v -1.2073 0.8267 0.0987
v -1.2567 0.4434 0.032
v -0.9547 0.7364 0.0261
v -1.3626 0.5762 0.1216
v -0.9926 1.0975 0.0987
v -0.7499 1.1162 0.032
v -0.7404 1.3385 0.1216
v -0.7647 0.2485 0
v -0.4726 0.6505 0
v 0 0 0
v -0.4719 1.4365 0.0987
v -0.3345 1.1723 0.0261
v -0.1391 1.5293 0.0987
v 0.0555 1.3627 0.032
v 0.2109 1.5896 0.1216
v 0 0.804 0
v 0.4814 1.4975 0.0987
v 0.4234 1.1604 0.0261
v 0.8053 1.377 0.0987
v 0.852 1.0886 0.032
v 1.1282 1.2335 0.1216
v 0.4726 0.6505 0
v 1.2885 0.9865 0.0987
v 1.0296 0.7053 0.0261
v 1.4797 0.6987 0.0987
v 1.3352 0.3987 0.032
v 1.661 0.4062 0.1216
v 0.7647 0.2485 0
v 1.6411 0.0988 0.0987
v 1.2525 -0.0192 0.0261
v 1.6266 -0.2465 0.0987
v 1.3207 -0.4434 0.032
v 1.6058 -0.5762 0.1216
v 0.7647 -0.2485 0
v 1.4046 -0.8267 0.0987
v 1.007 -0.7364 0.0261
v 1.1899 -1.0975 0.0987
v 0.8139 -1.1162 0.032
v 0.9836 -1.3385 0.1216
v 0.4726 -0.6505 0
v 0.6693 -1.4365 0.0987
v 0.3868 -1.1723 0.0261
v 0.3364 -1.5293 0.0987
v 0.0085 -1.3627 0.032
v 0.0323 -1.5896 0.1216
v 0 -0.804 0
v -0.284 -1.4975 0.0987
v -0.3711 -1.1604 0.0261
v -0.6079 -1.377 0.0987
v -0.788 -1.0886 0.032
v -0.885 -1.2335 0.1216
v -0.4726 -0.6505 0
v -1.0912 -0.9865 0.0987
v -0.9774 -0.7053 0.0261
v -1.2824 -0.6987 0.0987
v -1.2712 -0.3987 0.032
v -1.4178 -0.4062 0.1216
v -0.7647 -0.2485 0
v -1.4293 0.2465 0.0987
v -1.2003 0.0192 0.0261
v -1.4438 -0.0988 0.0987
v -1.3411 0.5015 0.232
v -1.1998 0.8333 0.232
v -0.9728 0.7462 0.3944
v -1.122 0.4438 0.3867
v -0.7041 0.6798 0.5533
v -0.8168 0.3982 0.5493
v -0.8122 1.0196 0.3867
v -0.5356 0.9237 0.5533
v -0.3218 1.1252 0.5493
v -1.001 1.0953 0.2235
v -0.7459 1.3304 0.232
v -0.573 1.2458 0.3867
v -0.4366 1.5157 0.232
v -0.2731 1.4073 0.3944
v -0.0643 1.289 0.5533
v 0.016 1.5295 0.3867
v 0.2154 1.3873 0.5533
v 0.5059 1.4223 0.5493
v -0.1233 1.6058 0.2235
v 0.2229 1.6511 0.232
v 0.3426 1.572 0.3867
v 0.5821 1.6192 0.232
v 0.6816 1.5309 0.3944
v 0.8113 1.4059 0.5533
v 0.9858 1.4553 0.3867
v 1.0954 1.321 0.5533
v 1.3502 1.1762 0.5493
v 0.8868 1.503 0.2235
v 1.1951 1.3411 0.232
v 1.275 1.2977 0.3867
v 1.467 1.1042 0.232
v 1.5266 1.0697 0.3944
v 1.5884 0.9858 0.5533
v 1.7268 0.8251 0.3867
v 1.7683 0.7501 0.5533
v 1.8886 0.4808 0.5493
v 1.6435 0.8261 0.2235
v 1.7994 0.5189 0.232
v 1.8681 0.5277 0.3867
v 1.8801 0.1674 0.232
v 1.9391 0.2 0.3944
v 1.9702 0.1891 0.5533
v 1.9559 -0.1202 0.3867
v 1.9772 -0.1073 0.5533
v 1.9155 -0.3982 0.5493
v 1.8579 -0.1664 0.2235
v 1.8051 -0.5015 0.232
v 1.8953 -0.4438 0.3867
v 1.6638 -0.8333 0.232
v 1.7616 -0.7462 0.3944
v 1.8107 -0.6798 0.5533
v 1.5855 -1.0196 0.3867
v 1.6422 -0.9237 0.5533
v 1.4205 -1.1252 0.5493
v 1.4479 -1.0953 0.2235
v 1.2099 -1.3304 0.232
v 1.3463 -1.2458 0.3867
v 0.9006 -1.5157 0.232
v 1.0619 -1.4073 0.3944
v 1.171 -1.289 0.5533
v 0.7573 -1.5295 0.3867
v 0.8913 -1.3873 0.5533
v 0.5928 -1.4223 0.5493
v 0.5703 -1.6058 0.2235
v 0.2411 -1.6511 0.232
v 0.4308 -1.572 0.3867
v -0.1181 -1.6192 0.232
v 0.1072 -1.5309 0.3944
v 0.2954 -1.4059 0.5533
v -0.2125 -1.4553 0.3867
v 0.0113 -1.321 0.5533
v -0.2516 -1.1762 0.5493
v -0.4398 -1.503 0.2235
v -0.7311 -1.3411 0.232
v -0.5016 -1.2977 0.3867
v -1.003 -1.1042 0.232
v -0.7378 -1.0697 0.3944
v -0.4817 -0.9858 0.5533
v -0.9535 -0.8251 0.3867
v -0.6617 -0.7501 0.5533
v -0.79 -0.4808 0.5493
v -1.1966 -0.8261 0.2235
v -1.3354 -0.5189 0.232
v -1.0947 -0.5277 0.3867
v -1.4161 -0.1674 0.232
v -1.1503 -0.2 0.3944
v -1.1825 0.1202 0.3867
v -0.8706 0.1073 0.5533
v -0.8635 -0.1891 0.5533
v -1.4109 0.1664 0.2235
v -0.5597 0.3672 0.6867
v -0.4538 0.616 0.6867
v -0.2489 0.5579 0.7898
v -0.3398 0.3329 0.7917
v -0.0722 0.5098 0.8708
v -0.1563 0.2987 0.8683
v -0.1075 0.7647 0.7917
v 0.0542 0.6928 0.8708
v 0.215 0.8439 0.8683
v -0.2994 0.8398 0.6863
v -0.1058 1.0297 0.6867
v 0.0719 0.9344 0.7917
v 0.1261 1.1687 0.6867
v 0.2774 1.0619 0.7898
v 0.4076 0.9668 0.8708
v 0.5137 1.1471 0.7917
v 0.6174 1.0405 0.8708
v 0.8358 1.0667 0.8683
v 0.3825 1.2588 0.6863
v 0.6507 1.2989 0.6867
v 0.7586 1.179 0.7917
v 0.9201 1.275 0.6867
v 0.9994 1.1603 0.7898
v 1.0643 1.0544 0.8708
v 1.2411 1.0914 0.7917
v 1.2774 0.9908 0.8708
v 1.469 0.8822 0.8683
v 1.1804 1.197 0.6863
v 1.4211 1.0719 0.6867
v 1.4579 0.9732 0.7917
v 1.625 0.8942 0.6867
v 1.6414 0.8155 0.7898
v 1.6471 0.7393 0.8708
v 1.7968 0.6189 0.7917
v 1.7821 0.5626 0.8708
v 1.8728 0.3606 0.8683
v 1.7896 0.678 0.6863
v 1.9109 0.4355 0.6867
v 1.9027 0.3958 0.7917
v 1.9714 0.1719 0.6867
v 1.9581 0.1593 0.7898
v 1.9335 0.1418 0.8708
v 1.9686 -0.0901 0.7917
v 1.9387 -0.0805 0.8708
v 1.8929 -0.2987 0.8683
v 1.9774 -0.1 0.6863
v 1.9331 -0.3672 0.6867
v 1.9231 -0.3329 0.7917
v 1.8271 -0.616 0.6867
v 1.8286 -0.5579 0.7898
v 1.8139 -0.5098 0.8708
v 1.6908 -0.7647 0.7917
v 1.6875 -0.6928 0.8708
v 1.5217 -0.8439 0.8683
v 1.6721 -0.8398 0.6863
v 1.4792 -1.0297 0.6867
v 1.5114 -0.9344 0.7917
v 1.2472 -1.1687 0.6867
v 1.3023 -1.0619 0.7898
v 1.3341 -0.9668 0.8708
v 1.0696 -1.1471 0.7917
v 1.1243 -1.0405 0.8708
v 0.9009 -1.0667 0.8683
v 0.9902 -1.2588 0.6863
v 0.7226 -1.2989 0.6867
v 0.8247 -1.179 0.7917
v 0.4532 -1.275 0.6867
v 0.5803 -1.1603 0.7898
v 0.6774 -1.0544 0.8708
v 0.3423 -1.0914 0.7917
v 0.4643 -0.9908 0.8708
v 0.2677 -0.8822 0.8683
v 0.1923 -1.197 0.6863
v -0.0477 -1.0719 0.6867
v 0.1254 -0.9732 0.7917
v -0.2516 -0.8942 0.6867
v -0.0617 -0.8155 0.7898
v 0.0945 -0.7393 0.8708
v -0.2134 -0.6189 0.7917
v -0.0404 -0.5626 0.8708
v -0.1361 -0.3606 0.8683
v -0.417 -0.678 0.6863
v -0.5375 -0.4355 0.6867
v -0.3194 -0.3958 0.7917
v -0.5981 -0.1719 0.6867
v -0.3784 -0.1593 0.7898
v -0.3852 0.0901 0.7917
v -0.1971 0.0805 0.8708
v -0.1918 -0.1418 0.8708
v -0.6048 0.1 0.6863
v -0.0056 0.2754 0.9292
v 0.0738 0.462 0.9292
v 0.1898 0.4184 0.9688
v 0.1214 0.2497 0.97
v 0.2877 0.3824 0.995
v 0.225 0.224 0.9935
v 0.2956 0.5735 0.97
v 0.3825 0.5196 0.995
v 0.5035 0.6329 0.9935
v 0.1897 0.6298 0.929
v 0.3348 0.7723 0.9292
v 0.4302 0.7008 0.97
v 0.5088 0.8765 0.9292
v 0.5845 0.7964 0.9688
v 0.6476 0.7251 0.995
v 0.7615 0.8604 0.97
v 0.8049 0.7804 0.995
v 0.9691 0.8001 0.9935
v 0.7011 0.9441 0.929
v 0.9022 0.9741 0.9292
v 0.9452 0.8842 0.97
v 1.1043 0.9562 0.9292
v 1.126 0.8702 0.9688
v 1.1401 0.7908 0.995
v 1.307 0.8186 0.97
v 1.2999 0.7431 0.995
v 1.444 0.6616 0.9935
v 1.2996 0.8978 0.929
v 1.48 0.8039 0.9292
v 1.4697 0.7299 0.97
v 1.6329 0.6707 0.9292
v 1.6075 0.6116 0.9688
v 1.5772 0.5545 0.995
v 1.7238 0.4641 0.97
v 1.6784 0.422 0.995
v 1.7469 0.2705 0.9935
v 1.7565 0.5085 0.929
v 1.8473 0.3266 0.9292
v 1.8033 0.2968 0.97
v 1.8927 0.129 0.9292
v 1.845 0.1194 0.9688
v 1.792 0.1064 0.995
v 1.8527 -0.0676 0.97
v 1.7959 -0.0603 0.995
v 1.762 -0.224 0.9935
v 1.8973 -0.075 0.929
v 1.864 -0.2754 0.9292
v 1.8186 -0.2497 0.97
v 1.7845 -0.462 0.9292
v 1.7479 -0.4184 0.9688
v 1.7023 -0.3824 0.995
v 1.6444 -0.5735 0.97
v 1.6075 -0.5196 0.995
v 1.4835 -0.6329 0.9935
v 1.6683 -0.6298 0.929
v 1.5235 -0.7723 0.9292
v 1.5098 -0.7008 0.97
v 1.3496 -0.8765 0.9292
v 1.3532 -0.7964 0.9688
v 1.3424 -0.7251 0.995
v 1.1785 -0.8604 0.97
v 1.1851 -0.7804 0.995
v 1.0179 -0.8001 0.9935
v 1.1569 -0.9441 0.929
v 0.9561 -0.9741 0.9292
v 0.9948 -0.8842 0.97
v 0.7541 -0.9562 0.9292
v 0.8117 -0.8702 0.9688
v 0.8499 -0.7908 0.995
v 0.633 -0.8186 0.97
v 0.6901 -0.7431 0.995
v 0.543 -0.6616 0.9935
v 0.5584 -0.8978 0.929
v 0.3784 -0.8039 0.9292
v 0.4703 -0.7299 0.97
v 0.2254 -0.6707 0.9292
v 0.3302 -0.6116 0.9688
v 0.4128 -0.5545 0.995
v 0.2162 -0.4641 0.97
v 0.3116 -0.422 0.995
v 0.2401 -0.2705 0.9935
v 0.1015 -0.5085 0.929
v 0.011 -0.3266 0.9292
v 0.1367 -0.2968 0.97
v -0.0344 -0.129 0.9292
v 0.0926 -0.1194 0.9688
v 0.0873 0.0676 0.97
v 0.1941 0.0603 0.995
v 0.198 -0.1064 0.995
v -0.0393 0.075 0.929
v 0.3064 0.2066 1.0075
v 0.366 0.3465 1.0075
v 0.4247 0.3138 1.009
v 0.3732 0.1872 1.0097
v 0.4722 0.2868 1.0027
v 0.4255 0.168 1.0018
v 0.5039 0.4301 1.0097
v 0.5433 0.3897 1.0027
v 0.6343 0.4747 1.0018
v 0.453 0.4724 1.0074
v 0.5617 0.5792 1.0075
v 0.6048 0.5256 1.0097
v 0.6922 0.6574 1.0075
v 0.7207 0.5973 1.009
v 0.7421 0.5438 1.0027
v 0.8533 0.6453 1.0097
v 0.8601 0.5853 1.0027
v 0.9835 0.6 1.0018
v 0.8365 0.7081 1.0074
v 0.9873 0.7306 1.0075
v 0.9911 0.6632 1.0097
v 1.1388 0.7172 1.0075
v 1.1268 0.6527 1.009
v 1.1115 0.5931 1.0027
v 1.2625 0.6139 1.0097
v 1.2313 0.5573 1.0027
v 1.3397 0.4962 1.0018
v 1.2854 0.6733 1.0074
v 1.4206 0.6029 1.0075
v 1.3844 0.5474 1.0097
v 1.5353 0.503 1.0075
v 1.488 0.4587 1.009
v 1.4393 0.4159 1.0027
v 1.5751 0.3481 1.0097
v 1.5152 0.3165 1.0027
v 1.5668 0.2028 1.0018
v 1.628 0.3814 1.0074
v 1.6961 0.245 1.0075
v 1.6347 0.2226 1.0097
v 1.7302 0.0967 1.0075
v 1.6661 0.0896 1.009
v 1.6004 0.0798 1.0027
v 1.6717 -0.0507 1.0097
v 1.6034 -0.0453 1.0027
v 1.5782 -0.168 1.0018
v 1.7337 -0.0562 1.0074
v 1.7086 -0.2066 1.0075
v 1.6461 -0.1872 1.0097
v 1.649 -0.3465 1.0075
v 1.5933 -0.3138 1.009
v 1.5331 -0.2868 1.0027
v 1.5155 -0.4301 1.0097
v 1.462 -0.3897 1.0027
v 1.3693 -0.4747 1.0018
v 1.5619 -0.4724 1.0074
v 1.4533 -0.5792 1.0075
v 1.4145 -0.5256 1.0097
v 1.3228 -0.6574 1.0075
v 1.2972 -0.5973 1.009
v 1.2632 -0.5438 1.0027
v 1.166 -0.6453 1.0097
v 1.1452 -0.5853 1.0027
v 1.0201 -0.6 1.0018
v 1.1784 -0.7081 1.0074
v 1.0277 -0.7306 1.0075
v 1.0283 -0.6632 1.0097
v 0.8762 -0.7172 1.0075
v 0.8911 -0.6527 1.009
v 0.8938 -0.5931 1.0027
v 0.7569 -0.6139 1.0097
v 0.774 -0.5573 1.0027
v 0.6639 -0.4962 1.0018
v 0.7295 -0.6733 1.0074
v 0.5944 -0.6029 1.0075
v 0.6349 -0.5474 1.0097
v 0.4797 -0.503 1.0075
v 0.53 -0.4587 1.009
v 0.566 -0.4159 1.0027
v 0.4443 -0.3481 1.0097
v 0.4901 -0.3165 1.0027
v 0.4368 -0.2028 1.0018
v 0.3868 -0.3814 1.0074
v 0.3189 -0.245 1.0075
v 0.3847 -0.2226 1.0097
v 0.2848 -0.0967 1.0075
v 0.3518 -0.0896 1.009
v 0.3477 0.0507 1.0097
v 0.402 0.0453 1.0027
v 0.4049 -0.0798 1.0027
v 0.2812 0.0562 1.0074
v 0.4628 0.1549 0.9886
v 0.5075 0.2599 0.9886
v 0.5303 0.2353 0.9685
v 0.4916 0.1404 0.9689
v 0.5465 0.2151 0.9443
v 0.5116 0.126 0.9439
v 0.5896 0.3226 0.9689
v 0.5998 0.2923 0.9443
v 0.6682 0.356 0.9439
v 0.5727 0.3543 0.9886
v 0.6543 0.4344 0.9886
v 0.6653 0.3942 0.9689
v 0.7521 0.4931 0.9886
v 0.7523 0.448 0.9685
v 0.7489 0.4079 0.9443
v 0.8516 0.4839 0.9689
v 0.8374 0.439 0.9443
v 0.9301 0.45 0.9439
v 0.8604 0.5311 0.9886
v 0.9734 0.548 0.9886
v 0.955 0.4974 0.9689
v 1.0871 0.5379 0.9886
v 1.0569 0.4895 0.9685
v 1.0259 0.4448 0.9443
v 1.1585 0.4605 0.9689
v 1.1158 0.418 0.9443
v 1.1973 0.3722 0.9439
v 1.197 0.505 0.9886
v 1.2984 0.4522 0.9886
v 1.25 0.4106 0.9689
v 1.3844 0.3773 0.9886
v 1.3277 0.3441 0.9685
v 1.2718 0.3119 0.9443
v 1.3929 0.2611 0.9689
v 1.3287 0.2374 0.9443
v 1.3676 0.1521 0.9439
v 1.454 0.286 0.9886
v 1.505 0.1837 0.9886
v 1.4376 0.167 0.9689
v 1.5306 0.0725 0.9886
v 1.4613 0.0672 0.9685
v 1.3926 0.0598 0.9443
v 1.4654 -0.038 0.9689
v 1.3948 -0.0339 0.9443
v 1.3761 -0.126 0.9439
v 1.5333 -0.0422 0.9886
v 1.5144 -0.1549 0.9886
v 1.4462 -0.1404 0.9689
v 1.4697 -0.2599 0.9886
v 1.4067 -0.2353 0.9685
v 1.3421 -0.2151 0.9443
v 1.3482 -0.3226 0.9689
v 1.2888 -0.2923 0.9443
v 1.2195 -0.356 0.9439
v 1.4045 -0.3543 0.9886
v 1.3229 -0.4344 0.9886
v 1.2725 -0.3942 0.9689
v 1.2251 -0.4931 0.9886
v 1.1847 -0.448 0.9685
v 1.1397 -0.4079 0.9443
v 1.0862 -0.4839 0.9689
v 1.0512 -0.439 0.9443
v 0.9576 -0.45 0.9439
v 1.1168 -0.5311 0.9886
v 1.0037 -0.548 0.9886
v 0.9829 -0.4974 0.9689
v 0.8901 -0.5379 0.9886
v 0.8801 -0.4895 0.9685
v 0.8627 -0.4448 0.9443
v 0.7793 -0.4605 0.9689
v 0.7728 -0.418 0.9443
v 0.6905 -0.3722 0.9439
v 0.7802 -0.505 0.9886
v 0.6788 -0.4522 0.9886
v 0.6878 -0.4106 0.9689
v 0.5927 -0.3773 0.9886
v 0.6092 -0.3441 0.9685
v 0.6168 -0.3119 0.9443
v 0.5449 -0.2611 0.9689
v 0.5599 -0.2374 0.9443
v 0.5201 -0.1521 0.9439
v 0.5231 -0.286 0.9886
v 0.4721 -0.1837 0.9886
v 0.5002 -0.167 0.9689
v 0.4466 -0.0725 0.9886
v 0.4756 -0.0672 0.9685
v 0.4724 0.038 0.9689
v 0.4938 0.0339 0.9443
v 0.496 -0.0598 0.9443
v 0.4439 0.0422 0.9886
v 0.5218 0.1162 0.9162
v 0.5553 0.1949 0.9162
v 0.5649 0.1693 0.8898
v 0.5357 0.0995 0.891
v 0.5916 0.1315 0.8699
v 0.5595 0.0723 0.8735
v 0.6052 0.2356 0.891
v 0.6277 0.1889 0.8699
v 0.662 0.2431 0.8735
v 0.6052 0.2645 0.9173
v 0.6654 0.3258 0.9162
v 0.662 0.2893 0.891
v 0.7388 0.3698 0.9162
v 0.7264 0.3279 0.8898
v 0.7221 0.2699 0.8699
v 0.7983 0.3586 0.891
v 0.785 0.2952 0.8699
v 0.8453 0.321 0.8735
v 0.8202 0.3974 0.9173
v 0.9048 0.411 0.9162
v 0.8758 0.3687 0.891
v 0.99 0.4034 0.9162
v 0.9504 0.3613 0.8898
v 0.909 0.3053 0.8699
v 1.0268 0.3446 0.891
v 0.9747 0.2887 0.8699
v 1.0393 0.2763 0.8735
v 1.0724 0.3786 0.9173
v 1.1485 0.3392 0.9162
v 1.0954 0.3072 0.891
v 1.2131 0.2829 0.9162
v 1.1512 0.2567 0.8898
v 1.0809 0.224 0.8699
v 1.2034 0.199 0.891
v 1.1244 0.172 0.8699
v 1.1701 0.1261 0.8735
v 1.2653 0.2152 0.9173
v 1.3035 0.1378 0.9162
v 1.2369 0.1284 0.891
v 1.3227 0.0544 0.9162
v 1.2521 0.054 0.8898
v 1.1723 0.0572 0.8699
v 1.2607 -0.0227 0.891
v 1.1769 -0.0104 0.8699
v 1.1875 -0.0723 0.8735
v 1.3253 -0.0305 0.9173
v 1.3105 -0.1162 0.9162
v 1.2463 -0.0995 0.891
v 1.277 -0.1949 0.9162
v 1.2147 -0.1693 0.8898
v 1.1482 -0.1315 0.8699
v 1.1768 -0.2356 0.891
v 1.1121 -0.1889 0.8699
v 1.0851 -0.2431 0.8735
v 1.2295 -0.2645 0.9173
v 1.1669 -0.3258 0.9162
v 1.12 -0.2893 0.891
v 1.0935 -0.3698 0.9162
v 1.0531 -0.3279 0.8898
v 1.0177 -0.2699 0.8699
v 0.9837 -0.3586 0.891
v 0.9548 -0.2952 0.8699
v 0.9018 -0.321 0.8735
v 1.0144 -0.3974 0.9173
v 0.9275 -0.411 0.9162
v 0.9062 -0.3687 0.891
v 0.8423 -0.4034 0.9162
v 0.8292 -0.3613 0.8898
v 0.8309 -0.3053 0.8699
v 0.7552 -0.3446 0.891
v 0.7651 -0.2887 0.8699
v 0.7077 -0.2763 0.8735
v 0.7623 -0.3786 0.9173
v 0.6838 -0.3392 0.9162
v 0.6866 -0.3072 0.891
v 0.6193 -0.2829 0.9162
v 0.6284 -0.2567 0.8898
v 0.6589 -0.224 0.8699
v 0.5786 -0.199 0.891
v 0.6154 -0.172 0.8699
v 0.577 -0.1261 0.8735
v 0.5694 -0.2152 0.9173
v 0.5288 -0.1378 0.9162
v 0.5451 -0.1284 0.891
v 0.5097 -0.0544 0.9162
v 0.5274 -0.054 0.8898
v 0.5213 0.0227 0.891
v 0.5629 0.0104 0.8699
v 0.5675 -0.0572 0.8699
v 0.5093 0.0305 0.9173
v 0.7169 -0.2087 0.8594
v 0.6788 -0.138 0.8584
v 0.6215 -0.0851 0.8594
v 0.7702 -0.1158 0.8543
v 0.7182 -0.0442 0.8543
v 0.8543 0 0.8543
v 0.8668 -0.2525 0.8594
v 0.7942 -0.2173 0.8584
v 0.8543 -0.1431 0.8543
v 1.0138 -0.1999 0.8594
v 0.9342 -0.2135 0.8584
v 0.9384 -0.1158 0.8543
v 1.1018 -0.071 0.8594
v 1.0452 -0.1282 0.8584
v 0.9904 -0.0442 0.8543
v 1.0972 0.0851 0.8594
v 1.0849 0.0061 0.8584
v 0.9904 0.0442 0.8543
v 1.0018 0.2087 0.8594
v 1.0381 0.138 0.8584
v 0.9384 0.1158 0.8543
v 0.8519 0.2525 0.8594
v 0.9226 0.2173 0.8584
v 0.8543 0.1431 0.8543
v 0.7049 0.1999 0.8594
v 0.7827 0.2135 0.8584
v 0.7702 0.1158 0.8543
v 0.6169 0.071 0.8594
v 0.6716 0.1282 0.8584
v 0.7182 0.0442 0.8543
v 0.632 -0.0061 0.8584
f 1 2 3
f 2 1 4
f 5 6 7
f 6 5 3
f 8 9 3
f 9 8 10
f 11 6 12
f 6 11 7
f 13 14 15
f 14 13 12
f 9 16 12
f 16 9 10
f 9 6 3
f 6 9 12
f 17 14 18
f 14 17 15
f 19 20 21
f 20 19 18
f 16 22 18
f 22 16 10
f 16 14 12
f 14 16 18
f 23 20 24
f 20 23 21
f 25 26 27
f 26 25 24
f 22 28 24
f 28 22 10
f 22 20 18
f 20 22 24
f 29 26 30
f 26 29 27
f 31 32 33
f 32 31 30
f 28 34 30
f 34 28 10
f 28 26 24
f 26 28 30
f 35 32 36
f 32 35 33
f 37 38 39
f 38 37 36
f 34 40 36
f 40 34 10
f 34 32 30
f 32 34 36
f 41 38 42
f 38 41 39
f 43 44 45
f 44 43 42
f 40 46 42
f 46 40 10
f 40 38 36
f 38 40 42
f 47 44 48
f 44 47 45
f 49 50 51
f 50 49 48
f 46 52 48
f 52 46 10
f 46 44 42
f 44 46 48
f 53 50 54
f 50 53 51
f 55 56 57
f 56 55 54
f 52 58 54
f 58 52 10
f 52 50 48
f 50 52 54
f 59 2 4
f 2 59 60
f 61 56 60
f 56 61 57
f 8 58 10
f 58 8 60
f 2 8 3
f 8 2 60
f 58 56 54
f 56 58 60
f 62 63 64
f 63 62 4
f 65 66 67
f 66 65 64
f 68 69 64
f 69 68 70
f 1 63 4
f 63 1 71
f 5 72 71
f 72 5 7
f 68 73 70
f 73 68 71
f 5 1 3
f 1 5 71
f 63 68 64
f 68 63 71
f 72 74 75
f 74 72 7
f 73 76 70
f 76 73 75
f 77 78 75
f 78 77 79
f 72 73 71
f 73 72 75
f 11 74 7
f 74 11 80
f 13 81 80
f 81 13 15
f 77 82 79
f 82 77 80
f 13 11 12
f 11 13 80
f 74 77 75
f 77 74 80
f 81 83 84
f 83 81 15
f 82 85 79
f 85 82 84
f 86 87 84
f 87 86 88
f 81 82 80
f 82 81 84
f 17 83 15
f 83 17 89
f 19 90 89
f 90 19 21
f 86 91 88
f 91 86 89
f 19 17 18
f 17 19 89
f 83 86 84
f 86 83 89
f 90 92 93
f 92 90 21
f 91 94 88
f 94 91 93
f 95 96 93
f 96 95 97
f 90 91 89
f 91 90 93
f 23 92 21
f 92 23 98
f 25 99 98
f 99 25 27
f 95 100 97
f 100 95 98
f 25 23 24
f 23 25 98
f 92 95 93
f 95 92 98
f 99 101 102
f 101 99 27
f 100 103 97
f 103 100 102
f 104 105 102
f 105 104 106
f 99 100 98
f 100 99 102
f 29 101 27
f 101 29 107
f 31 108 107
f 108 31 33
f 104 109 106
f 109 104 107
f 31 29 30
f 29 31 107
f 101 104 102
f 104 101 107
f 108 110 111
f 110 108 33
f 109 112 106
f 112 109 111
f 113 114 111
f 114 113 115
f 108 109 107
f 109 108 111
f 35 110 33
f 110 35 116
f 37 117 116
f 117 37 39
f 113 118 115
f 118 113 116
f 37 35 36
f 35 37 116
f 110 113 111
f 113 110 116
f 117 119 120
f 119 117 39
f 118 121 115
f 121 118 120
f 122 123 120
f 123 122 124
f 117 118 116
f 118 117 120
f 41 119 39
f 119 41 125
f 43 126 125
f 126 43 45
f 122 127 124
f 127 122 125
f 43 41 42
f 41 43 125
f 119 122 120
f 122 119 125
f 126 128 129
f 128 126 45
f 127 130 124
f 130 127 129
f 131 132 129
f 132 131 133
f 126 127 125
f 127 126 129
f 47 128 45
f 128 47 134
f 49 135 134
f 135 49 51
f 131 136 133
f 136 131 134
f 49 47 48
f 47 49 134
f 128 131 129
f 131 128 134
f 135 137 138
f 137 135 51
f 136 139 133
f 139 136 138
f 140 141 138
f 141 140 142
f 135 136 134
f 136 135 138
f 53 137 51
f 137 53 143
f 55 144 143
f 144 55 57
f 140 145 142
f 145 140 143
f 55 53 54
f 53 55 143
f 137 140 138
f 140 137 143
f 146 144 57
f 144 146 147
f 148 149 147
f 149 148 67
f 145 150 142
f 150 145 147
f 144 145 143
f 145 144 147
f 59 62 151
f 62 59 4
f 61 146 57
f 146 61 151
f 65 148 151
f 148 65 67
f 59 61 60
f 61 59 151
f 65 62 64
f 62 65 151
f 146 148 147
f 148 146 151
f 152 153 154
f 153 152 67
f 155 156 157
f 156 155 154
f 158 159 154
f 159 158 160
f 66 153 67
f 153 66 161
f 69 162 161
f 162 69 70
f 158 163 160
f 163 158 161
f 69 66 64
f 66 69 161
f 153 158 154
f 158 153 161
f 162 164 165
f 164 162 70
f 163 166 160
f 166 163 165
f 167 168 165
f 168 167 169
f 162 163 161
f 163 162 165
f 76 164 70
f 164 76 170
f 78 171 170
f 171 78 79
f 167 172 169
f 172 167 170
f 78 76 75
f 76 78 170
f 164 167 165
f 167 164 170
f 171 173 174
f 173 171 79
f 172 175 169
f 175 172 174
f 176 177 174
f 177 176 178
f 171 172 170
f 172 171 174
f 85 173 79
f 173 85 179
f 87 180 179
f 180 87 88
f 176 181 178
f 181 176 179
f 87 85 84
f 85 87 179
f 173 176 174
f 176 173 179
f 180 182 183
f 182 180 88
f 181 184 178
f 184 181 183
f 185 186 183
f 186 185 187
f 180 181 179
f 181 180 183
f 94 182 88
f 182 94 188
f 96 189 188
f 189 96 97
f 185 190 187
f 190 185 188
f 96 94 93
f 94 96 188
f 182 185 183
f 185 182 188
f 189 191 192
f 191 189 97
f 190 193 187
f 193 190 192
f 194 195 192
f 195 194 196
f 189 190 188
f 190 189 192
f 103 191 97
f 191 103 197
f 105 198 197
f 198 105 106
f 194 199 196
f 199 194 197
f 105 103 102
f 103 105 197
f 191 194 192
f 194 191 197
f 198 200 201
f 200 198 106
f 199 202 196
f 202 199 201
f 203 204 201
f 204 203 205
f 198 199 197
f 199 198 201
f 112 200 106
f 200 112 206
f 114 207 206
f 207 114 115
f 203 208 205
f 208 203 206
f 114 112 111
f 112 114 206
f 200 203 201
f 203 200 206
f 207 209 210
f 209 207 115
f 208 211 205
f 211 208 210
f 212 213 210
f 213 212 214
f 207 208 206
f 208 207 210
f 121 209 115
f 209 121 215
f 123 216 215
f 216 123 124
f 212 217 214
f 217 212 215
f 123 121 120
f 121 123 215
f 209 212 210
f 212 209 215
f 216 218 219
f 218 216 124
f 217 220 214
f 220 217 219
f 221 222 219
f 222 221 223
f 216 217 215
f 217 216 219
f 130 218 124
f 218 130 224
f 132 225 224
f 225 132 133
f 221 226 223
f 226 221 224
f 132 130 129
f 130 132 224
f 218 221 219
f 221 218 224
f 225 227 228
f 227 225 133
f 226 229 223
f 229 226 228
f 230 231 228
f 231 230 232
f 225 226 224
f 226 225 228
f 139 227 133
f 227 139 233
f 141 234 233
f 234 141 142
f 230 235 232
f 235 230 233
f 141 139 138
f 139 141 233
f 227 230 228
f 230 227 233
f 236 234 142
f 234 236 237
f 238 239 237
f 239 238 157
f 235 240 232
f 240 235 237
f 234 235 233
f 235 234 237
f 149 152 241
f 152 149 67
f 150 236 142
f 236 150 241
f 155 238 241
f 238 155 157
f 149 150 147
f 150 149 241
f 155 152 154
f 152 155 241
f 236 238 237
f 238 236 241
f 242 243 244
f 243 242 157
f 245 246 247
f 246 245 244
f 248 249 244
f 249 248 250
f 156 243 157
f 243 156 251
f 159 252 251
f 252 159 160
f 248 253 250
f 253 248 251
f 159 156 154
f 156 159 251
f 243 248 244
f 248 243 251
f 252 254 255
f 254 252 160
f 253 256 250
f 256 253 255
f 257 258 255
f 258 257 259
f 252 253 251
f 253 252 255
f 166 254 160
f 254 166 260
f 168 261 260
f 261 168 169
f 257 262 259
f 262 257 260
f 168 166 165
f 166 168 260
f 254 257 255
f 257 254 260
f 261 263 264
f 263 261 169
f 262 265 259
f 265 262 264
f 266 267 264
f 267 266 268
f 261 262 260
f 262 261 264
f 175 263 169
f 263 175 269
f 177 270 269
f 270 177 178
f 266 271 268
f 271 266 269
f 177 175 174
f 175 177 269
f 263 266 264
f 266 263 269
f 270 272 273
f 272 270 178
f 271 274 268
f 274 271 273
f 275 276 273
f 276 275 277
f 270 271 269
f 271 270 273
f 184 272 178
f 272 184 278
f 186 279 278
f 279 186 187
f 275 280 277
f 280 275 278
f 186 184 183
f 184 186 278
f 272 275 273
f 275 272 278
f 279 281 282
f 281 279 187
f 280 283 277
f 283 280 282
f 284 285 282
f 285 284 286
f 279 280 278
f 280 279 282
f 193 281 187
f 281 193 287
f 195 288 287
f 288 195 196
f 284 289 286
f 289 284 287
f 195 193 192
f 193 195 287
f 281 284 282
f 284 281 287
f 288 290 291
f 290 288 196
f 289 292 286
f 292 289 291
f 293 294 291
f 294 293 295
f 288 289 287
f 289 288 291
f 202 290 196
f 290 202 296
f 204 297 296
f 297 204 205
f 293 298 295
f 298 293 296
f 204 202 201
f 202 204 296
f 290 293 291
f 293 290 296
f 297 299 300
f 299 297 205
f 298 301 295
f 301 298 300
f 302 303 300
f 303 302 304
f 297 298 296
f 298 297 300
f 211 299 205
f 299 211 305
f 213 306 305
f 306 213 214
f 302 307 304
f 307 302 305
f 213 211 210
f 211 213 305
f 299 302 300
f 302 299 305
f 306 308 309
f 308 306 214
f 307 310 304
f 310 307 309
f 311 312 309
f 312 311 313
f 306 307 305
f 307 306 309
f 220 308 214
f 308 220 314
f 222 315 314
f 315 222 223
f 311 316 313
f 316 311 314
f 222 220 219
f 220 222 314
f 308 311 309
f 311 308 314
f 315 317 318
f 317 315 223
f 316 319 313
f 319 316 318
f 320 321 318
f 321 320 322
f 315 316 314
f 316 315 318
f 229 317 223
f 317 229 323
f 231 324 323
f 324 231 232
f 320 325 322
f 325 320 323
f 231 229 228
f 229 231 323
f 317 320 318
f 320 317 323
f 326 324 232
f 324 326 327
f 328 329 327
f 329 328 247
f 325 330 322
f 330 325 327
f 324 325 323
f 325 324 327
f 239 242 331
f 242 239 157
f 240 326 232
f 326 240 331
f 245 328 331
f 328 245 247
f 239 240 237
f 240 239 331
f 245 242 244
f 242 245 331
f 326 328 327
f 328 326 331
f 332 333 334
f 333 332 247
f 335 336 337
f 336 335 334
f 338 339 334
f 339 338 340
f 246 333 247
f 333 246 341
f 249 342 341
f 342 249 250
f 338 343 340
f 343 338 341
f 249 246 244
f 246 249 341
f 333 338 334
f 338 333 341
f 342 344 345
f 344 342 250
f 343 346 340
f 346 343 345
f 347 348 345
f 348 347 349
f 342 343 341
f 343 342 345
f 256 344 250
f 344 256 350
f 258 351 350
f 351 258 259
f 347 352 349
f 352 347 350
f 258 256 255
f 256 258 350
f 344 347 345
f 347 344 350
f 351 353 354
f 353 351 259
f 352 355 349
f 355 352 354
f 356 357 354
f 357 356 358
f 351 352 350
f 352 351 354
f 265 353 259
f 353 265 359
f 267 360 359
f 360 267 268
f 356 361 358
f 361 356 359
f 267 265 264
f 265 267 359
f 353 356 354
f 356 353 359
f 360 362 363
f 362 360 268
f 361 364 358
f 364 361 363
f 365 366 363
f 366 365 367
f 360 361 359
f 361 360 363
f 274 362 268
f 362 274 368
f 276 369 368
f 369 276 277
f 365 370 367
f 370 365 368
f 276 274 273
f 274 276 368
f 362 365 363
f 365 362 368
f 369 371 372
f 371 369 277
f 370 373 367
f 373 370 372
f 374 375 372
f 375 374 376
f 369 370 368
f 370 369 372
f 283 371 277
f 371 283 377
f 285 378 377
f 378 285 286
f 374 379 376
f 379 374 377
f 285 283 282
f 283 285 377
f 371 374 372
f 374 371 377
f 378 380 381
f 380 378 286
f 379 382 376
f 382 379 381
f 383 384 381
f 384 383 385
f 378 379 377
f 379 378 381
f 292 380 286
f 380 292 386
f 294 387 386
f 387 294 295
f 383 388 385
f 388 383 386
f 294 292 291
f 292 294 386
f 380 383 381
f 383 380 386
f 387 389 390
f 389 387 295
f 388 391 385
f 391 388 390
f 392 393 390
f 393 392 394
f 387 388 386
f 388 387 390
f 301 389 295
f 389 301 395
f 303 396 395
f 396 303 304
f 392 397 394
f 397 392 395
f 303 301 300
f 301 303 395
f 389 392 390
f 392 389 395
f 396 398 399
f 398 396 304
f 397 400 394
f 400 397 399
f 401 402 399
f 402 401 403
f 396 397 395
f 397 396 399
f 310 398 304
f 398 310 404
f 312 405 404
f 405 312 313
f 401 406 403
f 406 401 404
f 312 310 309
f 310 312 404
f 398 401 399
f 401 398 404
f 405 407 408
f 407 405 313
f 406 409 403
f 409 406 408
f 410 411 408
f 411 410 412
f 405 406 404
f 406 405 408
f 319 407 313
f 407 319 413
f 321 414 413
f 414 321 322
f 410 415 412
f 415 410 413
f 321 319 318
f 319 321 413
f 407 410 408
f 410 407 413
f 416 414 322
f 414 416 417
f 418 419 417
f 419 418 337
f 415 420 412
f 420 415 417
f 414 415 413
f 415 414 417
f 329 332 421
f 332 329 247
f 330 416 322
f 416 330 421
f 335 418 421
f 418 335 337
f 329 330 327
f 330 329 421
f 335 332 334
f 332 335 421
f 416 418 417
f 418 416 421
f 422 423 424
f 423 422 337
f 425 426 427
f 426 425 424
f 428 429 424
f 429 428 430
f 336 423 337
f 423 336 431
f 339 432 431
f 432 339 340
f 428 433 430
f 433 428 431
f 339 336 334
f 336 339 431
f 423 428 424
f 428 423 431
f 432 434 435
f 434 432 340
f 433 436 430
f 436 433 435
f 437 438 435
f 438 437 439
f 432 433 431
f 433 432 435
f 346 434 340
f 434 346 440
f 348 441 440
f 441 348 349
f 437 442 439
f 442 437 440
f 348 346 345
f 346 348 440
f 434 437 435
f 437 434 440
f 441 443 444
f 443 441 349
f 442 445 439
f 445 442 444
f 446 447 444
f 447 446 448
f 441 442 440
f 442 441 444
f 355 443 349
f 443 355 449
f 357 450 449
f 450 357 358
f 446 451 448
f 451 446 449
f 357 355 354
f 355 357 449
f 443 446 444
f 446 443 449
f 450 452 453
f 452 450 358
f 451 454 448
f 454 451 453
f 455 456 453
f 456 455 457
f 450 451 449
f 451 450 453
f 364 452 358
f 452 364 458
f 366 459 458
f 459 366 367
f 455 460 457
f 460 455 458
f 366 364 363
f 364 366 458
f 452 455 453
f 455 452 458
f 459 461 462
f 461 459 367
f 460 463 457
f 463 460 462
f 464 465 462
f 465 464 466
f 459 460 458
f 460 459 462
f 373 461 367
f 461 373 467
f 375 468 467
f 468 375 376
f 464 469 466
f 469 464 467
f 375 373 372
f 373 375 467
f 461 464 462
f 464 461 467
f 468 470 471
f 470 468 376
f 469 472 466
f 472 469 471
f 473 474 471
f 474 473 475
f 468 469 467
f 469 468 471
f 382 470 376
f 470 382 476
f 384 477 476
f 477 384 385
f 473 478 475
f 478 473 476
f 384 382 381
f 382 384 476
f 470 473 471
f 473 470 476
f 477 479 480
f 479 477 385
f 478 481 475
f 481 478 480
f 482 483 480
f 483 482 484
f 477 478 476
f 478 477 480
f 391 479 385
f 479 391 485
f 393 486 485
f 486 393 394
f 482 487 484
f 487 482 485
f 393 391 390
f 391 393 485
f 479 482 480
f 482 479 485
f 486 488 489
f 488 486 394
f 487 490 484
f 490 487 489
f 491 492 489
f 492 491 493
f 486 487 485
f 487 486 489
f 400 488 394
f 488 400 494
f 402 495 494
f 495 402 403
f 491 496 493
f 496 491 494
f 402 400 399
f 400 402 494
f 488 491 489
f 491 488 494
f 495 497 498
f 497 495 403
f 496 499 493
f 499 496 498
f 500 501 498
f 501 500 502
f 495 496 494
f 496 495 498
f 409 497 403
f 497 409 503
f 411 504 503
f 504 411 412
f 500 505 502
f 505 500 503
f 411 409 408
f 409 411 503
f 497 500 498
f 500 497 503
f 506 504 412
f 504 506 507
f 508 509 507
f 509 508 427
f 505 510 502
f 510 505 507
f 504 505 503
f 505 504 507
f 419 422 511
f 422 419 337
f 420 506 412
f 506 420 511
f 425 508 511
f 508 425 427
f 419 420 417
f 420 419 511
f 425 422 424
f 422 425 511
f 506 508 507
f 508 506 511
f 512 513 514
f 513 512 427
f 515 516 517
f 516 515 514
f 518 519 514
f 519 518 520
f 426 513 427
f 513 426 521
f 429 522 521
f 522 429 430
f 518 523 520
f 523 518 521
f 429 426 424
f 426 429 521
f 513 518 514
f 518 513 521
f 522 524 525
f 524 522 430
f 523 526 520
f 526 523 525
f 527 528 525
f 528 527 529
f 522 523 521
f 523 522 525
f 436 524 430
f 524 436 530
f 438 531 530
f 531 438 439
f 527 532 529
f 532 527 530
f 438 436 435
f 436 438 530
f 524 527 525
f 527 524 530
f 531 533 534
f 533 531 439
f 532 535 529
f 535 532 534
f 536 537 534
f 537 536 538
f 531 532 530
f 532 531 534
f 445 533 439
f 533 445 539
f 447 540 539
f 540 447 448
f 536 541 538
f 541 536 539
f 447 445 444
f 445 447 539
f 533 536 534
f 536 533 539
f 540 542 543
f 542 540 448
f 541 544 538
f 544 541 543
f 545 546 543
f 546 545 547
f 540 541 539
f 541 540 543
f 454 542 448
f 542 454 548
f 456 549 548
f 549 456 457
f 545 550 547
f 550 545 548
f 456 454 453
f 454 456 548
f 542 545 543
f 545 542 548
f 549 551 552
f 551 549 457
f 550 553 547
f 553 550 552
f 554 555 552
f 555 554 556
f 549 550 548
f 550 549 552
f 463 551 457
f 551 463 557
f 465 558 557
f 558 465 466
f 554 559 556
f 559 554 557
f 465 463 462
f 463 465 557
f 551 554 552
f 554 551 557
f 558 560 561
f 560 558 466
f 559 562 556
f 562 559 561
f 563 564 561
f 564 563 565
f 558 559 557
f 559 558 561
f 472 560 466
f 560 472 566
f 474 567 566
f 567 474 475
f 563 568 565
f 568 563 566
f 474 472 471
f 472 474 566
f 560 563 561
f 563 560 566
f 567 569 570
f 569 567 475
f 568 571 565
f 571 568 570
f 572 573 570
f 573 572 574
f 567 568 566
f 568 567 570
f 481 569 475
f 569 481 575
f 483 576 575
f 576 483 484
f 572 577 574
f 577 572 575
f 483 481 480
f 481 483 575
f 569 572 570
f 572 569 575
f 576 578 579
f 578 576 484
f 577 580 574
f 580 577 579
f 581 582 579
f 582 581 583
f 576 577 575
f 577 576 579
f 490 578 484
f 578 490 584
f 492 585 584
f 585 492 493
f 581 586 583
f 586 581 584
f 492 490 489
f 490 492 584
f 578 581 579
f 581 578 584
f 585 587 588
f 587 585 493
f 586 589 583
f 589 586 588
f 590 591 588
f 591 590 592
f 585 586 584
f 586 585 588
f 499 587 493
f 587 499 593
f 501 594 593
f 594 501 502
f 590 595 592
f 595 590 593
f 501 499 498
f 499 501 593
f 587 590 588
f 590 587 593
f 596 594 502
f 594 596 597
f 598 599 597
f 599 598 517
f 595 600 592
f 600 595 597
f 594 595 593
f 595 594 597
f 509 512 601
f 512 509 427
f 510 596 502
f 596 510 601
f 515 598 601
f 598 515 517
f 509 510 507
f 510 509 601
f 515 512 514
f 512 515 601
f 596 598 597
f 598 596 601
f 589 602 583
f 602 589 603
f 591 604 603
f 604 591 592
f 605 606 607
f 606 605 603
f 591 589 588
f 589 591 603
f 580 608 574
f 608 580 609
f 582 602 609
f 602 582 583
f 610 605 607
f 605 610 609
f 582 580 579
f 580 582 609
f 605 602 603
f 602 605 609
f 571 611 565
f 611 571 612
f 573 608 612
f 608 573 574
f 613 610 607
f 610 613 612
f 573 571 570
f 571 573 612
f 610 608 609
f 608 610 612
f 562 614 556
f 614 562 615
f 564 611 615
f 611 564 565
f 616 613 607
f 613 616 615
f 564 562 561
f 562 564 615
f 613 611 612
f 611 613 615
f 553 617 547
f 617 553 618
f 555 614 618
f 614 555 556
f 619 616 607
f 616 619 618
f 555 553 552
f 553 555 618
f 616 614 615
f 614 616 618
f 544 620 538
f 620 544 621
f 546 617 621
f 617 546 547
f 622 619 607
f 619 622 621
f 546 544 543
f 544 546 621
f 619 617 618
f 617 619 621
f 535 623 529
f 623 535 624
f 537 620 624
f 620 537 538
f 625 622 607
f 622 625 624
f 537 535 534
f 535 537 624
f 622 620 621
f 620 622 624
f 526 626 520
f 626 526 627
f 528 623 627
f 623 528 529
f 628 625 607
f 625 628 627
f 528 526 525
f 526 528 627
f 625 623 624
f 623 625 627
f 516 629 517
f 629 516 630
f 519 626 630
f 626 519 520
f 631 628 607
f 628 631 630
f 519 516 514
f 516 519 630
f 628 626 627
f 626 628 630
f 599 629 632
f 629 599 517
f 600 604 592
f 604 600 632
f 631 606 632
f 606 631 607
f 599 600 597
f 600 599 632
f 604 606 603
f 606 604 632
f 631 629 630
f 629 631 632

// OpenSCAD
C0 = (un(rndc()) + [2, 0, 0]);
C1 = (un(rndc()) + [2, 2, 0]);
C2 = (un(rndc()) + [0, 2, 2]);
m=[ringrot(ringon(10,2),0),[[0,1,10],[1,2,10],[2,3,10],[3,4,10],[4,5,10],[5,6,10],[6,7,10],[7,8,10],[8,9,10],[9,0,10]]];//


d=extrude(m,[0,1,2,3,4,5,6,7,8,9 ],[0.6,0,0.6],0.75,6);
//polyhedron(d[0],d[1]);
t=cc(d,2,0.6);
//echo(m[0]);
for (i=[0:max(0,len(m[1])-1)])echo( m[0][i]);

//trender(t);
polyhedron(t[0],t[1]);

function extrude(mesh,ring, length,scali,n=0)=
let(rl=len(ring),oldfaces=mesh[1],oldpoints=mesh[0],pl=len(oldpoints),

newpoints=[for (i=[0:rl-1])oldpoints[ring[i]]*scali+length],

newfaces=[for (ii=[0:0.5:rl-0.5])let(i=floor(ii))i==ii?

[ring[i],pl+i,pl+((i+1)%rl)]
:
[ring[i],pl+((i+1)%rl),ring[((i+1)%rl)]]],



newmesh=[concat(oldpoints,newpoints),concat(oldfaces,newfaces)]
)n>1?
let(newring=[for (i=[0:rl-1])(pl+i)])
extrude(newmesh,newring,length*0.75,scali,n-1)
:
let(newring=concat([for (i=[0:rl-1])((pl+rl)-1-i)],pl+rl))
[concat(oldpoints,newpoints,[avrg(newpoints)]),concat(oldfaces,newfaces,ring2faces(newring))]
 ;


function ring2faces(ring)=let(lr=len(ring))[for(i=[0:lr-2])[ring[i],ring[((i+1)%(lr-1))],ring[lr-1]]];


































module trender(t){
for (i=[0:max(0,len(t[1])-1)]){
  n = un(p2n(t[0][t[1][i][0]],t[0][t[1][i][1]],t[0][t[1][i][2]]));
color(un((C0 * abs(n[0]) + C1 * abs(n[1]) + C2 * abs(n[2]) + [1, 1, 1] * abs(n[2])) / 4)) 
polyhedron(t[0],[t[1][i]]);

}}



function cc(V,n=1,curve=0.61803398875)=n<=0?V:n==1?
let(w=V)
let(ed= cccheck(ccquicksort(ccquicksort(ccquicksort(ccquicksort(ccde(w[1],len(w[0])-1),2),1),0),1)))

let (nf=ccnf(ed))
[ccnv(w,nf,curve),nf]
:
let(w=cc(V,n-1,curve))
let(ed= cccheck(ccquicksort(ccquicksort(ccquicksort(ccquicksort(ccde(w[1],len(w[0])-1),2),1),0),1)))
let (nf=ccnf(ed))
[ccnv(w,nf,curve),nf]
;


function ccnv(v,nf,curve)=
let (nv=[for(i=[0:len(v[1])-1]) (v[0][v[1][i][0]]+v[0][v[1][i][1]]+v[0][v[1][i][2]])/3 ])
let(sfv= [ for(i=[0:len(v[0])-1]) avrg(ccfind(i,v[1],nv))])
concat(lerp(v[0],sfv,curve),nv);

function ccnf(hf)=
[for(i=[0:1:len(hf)-1])
(i%2)==0?
[hf[i][4],hf[(i+1)%len(hf)][2],hf[i][2]]
:
[hf[i][4],hf[(i-1)%len(hf)][2],hf[i][2]]
];

function ccde(faces,points) =
let(l=len(faces)-1)
   [for (i=[0:l])
    let(f = faces[i])
       for (j=[0:len(f)-1])
          let(p=f[j],q=f[(j+1)%len(f)])
              [min(p,q),max(p,q),i+points+1,p,q]  // no duplicates
   ];
function cccheck(ed)=concat(
[for(i=[0:len(ed)-1])if(
(ed[i][0]==ed[i-1][0]&&ed[i][1]==ed[i-1][1])
||(ed[i][0]==ed[i+1][0]&&ed[i][1]==ed[i+1][1])
)ed[i]]);
function ccfind(lookfor,faces,nv) =  
     [ for (i=[0:len(faces)-1]) if(
faces[i][0]==lookfor||faces[i][1]==lookfor||faces[i][2]==lookfor) nv[i] ];

function ccquicksort(arr,o) = !(len(arr)>0) ? [] : let(
    pivot   = arr[floor(len(arr)/2)],
    lesser  = [ for (y = arr) if (y[o]  < pivot[o]) y ],
    equal   = [ for (y = arr) if (y[o] == pivot[o]) y ],
    greater = [ for (y = arr) if (y[o]  > pivot[o]) y ]
) 
concat(
    ccquicksort(lesser,o), equal, ccquicksort(greater,o)
);
function wave(w,a=1,b=1)=[[for(i=[0:len(w[0])-1])
let(x=w[0][i][0],y=w[0][i][1],z=w[0][i][2])
w[0][i]+[sin((y+z)*b)*a,sin((z+x)*b)*a,sin((x+y)*b)*a]],w[1]]; 
function ccweld(v)=let(data=v[0])
[v[0],[for (i= [0:len(v[1])-1])let(index1=v[1][i][0],index2=v[1][i][1],index3=v[1][i][2])

concat(search(data[index1][0],data),search(data[index2][0],data),search(data[index3][0],data,1))
]];

function ccflip(w)=[w[0],[for(i=[0:len(w[1])-1])[w[1][i][0],w[1][i][1],w[1][i][2]] ]];
function un(v) = v / max(len3(v), 0.000001) * 1;
function p2n(pa, pb, pc) =
let (u = pa - pb, v = pa - pc) un([u[1] * v[2] - u[2] * v[1], u[2] * v[0] - u[0] * v[2], u[0] * v[1] - u[1] * v[0]]);
function avrg(v) = sumv(v, max( 0,len(v) - 1)) / len(v);
function lerp(start, end, bias) = (end * bias + start * (1 - bias));
function len3(v) = len(v) == 2 ? sqrt(pow(v[0], 2) + pow(v[1], 2)) : sqrt(pow(v[0], 2) + pow(v[1], 2) + pow(v[2], 2));
function sumv(v, i, s = 0) = (i == s ? v[i] : v[i] + sumv(v, i - 1, s));
function rnd(a = 0, b = 1) = (rands(min(a, b), max(a, b), 1)[0]);

function rndc() = [rands(0, 1, 1)[0], rands(0, 1, 1)[0], rands(0, 1, 1)[0]];

function tiny() = [
[[1,1,-1],[1.30656,0.541196,-1],[1.41421,-0,-1],[1.30656,-0.541196,-1],[1,-1,-1],[0.541196,-1.30656,-1],[0,-1.41421,-1],[-0.541196,-1.30656,-1],[-1,-1,-1],[-1.30656,-0.541196,-1],[-1.41421,0,-1],[-1.30656,0.541196,-1],[-1,1,-1],[-0.541195,1.30656,-1],[0.006,1.41421,-1],[0.541197,1.30656,-1],[1,0.999999,1],[1.30656,0.541195,1],[1.41421,-0.006,1],[1.30656,-0.541198,1],[0.999998,-1,1],[0.541194,-1.30656,1],[-0.006,-1.41421,1],[-0.541199,-1.30656,1],[-1,-0.999998,1],[-1.30656,-0.541193,1],[-1.41421,0.006,1],[-1.30656,0.5412,1],[-0.999997,1,1],[-0.541192,1.30657,1],[0.006,1.41421,1],[0.541201,1.30656,1],[0,0,-1],[0,0,1]],

[[32,0,1],[33,17,16],[32,1,2],[33,18,17],[32,2,3],[33,19,18],[32,3,4],[33,20,19],[32,4,5],[33,21,20],[32,5,6],[33,22,21],[32,6,7],[33,23,22],[32,7,8],[33,24,23],[32,8,9],[33,25,24],[32,9,10],[33,26,25],[32,10,11],[33,27,26],[32,11,12],[33,28,27],[32,12,13],[33,29,28],[32,13,14],[33,30,29],[32,14,15],[33,31,30],[15,0,32],[33,16,31],[0,16,17],[0,17,1],[1,17,18],[1,18,2],[2,18,19],[2,19,3],[3,19,20],[3,20,4],[4,20,21],[4,21,5],[5,21,22],[5,22,6],[6,22,23],[6,23,7],[7,23,24],[7,24,8],[8,24,25],[8,25,9],[9,25,26],[9,26,10],[10,26,27],[10,27,11],[11,27,28],[11,28,12],[12,28,29],[12,29,13],[13,29,30],[13,30,14],[14,30,31],[14,31,15],[16,0,15],[16,15,31]]];


function ringtrans(v, t) = [
  for (i = [0: len(v) - 1])
    [
      v[i][0] + t[0],
      v[i][1] + t[1],
      v[i][2] + t[2]
    ]
];

function ringrot(r = [  [0, 0, 0]], v=0) = [
  for (i = [0: len(r) - 1]) let (inx = r[i][0], iny = r[i][1], inz = r[i][2])[
    inx * sin(v) - inz * cos(v),
    iny,
    inx * cos(v) + inz * sin(v)
  ]
];

function xring(x = 8,r=1,n=0 ) = concat([[n*0.5,0,0]],[  for (i = [(360 / x) * 0.5: 360 / x: 359])[n, sin(i)*r,  cos(i)*r]]);

function ringon(x = 8,r=1,n=0 ) = concat([  for (i = [(360 / x) * 0.5: 360 / x: 359])[n, sin(i)*r,  cos(i)*r]],[[0,0,0]]);

function cyl()=[concat(xring(8,10,-10), ringrot(xring(8,2,1),30)),[
[0,1,2],[0,2,3],[0,3,4],[0,4,5],[0,5,6],[0,6,7],[0,7,8],[0,8,1],

[2,1,10],[2,10,11],[3,2,11],[3,11,12],[4,3,12],[4,12,13],[5,4,13],[5,13,14],
[6,5,14],[6,14,15],[7,6,15],[7,15,16],[8,7,16],[8,16,17],[1,8,17],[1,17,10],

[10,9,11],[11,9,12],[12,9,13],[13,9,14],[14,9,15],[15,9,16],[16,9,17],
[17,9,10]]]
;
